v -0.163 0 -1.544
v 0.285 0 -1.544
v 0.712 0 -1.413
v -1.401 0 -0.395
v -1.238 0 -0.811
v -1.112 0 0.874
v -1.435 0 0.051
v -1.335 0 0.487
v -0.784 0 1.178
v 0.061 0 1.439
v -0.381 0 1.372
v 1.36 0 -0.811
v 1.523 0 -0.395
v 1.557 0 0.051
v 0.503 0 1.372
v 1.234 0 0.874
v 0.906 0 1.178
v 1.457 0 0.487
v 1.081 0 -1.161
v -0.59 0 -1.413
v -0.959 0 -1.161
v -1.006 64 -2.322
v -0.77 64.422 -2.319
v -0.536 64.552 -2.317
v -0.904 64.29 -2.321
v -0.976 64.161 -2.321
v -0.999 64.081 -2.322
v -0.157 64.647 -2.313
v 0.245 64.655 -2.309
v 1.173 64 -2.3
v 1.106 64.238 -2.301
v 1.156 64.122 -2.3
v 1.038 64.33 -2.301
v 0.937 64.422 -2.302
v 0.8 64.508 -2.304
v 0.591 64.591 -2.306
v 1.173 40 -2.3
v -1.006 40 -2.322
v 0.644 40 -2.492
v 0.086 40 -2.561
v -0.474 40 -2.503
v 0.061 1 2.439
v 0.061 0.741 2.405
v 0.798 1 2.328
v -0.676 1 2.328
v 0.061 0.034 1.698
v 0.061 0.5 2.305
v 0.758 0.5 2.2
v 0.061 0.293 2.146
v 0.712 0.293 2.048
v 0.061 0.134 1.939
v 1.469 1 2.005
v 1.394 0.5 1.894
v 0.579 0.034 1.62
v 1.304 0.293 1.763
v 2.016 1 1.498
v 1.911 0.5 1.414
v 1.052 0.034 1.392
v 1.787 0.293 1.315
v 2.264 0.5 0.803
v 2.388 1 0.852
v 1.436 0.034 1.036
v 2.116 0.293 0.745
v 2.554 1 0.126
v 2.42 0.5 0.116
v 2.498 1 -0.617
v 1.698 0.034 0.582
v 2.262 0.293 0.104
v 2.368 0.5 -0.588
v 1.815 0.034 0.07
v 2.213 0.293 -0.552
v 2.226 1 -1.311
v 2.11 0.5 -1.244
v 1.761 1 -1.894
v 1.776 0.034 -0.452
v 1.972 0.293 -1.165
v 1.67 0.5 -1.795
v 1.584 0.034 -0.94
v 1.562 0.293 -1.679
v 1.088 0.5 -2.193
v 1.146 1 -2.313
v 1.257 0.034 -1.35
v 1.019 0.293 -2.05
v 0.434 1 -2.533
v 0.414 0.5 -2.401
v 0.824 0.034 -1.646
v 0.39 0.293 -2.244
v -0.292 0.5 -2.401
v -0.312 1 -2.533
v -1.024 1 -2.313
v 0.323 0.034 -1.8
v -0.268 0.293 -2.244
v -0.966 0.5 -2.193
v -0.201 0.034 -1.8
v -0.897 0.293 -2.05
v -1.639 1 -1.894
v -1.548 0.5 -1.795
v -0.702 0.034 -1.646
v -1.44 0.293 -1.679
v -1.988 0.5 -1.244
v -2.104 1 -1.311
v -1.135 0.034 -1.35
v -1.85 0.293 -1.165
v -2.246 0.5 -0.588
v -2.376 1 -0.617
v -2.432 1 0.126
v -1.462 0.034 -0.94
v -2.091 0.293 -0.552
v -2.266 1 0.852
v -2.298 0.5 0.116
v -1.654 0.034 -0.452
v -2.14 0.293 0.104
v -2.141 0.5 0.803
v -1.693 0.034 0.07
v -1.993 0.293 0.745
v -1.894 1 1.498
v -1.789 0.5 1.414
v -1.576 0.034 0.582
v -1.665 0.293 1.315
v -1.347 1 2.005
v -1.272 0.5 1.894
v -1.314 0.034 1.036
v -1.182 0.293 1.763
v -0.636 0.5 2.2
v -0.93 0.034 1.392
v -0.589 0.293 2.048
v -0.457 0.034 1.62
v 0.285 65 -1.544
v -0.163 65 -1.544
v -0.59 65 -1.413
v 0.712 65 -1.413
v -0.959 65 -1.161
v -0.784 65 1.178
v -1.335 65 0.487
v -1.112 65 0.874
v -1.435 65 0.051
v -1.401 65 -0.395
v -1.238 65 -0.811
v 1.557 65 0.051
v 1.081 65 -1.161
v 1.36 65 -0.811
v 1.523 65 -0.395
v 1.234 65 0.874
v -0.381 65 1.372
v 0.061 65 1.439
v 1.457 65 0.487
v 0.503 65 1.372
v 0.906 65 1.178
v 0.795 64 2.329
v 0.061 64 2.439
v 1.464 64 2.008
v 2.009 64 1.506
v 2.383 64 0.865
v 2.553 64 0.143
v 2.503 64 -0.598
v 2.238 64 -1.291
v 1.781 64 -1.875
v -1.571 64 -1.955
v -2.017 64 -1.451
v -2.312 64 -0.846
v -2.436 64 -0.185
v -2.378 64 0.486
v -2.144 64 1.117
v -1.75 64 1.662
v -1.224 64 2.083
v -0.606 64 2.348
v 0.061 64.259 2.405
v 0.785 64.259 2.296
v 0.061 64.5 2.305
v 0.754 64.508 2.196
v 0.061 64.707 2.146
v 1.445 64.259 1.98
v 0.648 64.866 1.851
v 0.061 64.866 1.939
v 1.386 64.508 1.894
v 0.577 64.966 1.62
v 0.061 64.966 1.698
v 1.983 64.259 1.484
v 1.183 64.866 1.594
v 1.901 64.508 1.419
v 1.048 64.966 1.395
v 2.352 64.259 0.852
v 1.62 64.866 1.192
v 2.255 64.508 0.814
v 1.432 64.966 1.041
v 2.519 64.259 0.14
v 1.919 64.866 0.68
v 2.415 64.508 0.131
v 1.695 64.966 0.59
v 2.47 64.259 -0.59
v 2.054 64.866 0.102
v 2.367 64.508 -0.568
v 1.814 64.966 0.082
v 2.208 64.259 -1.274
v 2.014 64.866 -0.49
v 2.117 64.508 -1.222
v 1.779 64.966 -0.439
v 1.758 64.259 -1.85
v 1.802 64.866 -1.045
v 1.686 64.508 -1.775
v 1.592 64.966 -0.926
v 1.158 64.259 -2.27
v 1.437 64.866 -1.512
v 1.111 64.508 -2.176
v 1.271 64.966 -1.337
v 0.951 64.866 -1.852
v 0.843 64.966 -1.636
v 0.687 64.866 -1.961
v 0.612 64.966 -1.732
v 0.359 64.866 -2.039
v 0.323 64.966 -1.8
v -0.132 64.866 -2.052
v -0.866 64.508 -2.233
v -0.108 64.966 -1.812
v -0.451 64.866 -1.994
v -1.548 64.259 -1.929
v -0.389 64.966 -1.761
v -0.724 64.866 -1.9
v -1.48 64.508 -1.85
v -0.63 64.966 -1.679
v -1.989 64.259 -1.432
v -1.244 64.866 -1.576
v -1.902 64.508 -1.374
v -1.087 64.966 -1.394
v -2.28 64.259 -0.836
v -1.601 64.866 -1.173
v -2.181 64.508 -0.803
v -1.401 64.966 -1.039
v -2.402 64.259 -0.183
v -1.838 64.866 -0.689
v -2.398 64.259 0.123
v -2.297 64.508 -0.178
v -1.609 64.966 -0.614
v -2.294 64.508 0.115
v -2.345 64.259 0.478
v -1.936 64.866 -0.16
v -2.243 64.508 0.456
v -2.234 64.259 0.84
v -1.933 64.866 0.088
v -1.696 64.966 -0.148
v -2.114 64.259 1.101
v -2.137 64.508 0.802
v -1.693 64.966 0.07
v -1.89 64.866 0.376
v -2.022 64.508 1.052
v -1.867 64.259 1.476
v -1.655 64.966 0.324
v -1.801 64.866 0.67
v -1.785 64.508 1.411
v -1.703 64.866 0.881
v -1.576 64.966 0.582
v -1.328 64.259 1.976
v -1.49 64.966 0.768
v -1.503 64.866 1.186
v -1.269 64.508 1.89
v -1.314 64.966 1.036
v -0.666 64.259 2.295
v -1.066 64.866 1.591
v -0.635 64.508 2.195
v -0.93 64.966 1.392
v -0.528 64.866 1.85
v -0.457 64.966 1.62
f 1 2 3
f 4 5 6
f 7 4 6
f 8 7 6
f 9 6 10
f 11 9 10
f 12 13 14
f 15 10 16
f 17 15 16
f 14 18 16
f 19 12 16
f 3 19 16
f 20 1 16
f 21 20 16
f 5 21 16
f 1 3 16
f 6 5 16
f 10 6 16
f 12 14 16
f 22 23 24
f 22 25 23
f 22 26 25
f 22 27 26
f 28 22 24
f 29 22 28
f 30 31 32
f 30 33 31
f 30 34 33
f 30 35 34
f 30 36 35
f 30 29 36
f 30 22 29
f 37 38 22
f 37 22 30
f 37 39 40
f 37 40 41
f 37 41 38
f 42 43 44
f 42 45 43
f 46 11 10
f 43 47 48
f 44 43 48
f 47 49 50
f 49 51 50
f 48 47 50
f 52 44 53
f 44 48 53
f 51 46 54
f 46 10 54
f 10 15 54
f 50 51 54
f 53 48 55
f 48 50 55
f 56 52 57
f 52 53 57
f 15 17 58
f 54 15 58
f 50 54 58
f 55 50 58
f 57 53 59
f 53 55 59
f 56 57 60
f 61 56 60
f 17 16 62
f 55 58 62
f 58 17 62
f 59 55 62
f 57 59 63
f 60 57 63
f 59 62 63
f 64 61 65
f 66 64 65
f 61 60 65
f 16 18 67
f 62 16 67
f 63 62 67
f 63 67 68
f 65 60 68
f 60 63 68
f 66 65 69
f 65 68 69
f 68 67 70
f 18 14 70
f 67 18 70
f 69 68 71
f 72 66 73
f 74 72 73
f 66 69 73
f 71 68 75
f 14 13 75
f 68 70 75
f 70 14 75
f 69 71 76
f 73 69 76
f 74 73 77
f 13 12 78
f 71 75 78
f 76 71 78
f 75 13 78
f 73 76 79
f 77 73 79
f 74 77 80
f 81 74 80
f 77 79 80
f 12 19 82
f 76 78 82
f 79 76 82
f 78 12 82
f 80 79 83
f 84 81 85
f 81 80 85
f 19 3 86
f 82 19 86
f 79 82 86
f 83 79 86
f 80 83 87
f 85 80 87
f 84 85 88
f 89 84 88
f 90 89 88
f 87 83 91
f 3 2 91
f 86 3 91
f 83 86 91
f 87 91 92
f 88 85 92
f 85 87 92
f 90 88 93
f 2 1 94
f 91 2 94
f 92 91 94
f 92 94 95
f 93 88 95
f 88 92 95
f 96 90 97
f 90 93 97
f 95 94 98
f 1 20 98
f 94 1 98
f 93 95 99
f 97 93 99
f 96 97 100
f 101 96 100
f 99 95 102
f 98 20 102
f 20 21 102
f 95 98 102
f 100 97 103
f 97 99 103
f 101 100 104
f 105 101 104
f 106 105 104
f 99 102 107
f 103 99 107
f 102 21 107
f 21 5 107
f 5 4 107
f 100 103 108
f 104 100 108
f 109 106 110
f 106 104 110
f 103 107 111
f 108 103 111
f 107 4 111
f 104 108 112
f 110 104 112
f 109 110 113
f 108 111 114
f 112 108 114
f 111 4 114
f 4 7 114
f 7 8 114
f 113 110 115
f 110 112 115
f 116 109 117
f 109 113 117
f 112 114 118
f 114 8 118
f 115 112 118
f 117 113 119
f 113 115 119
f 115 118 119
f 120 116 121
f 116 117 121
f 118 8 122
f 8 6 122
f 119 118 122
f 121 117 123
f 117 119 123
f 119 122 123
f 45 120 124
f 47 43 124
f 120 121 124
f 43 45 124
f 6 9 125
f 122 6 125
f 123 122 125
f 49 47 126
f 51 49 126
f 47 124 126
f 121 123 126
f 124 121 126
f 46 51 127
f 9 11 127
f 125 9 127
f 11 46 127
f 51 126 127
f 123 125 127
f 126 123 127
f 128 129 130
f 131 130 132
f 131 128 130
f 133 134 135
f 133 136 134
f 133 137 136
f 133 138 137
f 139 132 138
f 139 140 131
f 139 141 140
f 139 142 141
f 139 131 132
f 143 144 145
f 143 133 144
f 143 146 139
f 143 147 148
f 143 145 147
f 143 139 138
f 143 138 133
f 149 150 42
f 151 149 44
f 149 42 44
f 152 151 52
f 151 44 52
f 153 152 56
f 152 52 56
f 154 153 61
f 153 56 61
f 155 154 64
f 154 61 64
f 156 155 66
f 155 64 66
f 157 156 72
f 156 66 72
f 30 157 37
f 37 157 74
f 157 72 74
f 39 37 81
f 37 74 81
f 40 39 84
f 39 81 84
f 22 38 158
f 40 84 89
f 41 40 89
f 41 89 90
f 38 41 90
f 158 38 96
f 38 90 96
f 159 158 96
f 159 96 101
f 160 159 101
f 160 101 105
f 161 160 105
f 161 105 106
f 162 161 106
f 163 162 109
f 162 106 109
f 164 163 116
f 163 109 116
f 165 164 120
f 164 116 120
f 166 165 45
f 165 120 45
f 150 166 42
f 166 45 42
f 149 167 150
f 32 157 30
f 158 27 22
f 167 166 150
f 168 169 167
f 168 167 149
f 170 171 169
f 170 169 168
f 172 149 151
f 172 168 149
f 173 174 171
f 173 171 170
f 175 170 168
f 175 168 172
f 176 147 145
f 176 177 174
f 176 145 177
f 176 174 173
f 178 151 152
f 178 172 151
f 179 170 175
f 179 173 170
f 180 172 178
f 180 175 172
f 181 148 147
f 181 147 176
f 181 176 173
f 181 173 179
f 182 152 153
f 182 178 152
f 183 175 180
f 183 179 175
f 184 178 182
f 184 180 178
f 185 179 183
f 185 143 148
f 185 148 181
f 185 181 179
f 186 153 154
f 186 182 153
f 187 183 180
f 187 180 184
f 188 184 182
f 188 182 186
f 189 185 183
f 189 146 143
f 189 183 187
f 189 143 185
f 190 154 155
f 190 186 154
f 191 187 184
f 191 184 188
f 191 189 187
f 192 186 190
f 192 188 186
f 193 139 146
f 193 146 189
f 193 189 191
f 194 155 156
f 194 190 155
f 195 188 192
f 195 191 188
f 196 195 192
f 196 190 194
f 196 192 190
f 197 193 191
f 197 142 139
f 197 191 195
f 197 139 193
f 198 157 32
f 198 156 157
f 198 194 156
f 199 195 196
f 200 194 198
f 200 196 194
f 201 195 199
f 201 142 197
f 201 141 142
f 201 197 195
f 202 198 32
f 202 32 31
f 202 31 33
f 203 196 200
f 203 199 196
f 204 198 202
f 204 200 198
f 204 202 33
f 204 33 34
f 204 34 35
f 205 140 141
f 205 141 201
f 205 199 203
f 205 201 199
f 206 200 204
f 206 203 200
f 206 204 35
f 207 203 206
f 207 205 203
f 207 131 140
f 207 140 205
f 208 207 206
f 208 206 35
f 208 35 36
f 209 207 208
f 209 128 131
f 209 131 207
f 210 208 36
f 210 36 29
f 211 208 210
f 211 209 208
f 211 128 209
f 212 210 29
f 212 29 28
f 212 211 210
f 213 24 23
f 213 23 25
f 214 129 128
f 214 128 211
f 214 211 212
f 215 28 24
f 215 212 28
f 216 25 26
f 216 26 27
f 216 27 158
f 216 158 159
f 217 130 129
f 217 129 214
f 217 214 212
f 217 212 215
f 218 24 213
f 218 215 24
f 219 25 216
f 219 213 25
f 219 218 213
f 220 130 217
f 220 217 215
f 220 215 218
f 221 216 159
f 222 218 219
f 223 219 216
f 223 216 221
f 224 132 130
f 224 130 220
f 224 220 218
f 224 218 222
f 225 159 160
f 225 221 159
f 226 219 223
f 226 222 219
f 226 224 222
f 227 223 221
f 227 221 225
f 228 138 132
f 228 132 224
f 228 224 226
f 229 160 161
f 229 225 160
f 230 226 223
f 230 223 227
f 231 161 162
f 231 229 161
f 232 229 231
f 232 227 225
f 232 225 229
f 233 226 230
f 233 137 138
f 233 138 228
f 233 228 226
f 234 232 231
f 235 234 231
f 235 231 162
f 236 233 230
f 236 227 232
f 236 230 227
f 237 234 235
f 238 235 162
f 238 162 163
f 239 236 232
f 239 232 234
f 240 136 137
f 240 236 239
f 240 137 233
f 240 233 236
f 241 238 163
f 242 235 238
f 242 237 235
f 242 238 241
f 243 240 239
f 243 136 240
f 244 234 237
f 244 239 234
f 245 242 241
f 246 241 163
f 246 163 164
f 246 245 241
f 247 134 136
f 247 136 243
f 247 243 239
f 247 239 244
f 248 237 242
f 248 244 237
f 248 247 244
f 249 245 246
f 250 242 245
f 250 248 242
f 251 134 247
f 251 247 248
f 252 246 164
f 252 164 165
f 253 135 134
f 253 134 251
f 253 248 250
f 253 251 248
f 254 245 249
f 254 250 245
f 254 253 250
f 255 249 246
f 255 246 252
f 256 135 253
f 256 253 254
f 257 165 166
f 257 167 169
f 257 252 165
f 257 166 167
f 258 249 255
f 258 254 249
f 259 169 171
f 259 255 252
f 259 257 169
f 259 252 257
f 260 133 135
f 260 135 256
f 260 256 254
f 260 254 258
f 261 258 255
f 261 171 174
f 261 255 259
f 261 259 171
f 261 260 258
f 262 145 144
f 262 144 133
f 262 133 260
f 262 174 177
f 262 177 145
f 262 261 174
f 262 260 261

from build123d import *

# Parameters (mm, degrees)
SKETCH2_R           = 2.5
BOSS_EXTRUDE1_DEPTH = 65
CUT_EXTRUDE1_START  = -25
CUT_EXTRUDE1_DEPTH  = 25
FILLET1_R           = 1
FILLET2_R           = 1


with BuildPart() as part:
    # Sketch2 → Boss-Extrude1 (new body)
    with BuildSketch(Plane(origin=(0, 0, 0), x_dir=(1, 0, 0), z_dir=(0, 1, 0))):
        with Locations(Location((0.061061942, 0.061061942, 0), (0, 0, 270))):
            Circle(SKETCH2_R)
    extrude(amount=BOSS_EXTRUDE1_DEPTH)

    # Sketch3 → Cut-Extrude1 (cut)
    with BuildSketch(Plane(origin=(0, 65, 0), x_dir=(1, 0, 0), z_dir=(0, 1, 0)).offset(CUT_EXTRUDE1_START)):
        with BuildLine():
            Line((-1.00625914, 2.321775482), (1.173082806, 2.300126389))
            ThreePointArc((1.173082806, 2.300126389), (0.085895154, 2.560938601), (-1.00625914, 2.321775482))
        make_face()
    extrude(amount=CUT_EXTRUDE1_DEPTH, mode=Mode.SUBTRACT)

    # Fillet1
    # the kernel refuses this fillet: 1 mm, written as the material it takes off along each edge
    with BuildSketch(Plane(origin=(0.061061942, 65, -0.061061942), x_dir=(0.5312663336495629, 0, -0.8472048646759243), z_dir=(0.8472048646759243, 0, 0.5312663336495629))) as fillet1_piece_1:
        with BuildLine():
            CenterArc((2.5 - FILLET1_R, -FILLET1_R), FILLET1_R, 0, 90)
            Line((2.5 - FILLET1_R, 0), (2.5, 0))
            Line((2.5, 0), (2.5, -FILLET1_R))
        make_face()
    revolve(axis=Axis((0.061061942, 65, -0.061061942), (0, 1, 0)), revolution_arc=212.091055881, mode=Mode.SUBTRACT)
    with BuildSketch(Plane(origin=(0.061061942, 65, -0.061061942), x_dir=(0, 0, 1), z_dir=(-1, 0, 0))) as fillet1_piece_2:
        with BuildLine():
            CenterArc((2.5 - FILLET1_R, -FILLET1_R), FILLET1_R, 0, 90)
            Line((2.5 - FILLET1_R, 0), (2.5, 0))
            Line((2.5, 0), (2.5, -FILLET1_R))
        make_face()
    revolve(axis=Axis((0.061061942, 65, -0.061061942), (0, 1, 0)), revolution_arc=210.951767977, mode=Mode.SUBTRACT)

    # Fillet2
    fillet2_edges = [part.edges().sort_by_distance(p)[0] for p in [
        (0.061061942, 0, -2.561061942),
    ]]
    fillet(fillet2_edges, radius=FILLET2_R)


solid = part.part
